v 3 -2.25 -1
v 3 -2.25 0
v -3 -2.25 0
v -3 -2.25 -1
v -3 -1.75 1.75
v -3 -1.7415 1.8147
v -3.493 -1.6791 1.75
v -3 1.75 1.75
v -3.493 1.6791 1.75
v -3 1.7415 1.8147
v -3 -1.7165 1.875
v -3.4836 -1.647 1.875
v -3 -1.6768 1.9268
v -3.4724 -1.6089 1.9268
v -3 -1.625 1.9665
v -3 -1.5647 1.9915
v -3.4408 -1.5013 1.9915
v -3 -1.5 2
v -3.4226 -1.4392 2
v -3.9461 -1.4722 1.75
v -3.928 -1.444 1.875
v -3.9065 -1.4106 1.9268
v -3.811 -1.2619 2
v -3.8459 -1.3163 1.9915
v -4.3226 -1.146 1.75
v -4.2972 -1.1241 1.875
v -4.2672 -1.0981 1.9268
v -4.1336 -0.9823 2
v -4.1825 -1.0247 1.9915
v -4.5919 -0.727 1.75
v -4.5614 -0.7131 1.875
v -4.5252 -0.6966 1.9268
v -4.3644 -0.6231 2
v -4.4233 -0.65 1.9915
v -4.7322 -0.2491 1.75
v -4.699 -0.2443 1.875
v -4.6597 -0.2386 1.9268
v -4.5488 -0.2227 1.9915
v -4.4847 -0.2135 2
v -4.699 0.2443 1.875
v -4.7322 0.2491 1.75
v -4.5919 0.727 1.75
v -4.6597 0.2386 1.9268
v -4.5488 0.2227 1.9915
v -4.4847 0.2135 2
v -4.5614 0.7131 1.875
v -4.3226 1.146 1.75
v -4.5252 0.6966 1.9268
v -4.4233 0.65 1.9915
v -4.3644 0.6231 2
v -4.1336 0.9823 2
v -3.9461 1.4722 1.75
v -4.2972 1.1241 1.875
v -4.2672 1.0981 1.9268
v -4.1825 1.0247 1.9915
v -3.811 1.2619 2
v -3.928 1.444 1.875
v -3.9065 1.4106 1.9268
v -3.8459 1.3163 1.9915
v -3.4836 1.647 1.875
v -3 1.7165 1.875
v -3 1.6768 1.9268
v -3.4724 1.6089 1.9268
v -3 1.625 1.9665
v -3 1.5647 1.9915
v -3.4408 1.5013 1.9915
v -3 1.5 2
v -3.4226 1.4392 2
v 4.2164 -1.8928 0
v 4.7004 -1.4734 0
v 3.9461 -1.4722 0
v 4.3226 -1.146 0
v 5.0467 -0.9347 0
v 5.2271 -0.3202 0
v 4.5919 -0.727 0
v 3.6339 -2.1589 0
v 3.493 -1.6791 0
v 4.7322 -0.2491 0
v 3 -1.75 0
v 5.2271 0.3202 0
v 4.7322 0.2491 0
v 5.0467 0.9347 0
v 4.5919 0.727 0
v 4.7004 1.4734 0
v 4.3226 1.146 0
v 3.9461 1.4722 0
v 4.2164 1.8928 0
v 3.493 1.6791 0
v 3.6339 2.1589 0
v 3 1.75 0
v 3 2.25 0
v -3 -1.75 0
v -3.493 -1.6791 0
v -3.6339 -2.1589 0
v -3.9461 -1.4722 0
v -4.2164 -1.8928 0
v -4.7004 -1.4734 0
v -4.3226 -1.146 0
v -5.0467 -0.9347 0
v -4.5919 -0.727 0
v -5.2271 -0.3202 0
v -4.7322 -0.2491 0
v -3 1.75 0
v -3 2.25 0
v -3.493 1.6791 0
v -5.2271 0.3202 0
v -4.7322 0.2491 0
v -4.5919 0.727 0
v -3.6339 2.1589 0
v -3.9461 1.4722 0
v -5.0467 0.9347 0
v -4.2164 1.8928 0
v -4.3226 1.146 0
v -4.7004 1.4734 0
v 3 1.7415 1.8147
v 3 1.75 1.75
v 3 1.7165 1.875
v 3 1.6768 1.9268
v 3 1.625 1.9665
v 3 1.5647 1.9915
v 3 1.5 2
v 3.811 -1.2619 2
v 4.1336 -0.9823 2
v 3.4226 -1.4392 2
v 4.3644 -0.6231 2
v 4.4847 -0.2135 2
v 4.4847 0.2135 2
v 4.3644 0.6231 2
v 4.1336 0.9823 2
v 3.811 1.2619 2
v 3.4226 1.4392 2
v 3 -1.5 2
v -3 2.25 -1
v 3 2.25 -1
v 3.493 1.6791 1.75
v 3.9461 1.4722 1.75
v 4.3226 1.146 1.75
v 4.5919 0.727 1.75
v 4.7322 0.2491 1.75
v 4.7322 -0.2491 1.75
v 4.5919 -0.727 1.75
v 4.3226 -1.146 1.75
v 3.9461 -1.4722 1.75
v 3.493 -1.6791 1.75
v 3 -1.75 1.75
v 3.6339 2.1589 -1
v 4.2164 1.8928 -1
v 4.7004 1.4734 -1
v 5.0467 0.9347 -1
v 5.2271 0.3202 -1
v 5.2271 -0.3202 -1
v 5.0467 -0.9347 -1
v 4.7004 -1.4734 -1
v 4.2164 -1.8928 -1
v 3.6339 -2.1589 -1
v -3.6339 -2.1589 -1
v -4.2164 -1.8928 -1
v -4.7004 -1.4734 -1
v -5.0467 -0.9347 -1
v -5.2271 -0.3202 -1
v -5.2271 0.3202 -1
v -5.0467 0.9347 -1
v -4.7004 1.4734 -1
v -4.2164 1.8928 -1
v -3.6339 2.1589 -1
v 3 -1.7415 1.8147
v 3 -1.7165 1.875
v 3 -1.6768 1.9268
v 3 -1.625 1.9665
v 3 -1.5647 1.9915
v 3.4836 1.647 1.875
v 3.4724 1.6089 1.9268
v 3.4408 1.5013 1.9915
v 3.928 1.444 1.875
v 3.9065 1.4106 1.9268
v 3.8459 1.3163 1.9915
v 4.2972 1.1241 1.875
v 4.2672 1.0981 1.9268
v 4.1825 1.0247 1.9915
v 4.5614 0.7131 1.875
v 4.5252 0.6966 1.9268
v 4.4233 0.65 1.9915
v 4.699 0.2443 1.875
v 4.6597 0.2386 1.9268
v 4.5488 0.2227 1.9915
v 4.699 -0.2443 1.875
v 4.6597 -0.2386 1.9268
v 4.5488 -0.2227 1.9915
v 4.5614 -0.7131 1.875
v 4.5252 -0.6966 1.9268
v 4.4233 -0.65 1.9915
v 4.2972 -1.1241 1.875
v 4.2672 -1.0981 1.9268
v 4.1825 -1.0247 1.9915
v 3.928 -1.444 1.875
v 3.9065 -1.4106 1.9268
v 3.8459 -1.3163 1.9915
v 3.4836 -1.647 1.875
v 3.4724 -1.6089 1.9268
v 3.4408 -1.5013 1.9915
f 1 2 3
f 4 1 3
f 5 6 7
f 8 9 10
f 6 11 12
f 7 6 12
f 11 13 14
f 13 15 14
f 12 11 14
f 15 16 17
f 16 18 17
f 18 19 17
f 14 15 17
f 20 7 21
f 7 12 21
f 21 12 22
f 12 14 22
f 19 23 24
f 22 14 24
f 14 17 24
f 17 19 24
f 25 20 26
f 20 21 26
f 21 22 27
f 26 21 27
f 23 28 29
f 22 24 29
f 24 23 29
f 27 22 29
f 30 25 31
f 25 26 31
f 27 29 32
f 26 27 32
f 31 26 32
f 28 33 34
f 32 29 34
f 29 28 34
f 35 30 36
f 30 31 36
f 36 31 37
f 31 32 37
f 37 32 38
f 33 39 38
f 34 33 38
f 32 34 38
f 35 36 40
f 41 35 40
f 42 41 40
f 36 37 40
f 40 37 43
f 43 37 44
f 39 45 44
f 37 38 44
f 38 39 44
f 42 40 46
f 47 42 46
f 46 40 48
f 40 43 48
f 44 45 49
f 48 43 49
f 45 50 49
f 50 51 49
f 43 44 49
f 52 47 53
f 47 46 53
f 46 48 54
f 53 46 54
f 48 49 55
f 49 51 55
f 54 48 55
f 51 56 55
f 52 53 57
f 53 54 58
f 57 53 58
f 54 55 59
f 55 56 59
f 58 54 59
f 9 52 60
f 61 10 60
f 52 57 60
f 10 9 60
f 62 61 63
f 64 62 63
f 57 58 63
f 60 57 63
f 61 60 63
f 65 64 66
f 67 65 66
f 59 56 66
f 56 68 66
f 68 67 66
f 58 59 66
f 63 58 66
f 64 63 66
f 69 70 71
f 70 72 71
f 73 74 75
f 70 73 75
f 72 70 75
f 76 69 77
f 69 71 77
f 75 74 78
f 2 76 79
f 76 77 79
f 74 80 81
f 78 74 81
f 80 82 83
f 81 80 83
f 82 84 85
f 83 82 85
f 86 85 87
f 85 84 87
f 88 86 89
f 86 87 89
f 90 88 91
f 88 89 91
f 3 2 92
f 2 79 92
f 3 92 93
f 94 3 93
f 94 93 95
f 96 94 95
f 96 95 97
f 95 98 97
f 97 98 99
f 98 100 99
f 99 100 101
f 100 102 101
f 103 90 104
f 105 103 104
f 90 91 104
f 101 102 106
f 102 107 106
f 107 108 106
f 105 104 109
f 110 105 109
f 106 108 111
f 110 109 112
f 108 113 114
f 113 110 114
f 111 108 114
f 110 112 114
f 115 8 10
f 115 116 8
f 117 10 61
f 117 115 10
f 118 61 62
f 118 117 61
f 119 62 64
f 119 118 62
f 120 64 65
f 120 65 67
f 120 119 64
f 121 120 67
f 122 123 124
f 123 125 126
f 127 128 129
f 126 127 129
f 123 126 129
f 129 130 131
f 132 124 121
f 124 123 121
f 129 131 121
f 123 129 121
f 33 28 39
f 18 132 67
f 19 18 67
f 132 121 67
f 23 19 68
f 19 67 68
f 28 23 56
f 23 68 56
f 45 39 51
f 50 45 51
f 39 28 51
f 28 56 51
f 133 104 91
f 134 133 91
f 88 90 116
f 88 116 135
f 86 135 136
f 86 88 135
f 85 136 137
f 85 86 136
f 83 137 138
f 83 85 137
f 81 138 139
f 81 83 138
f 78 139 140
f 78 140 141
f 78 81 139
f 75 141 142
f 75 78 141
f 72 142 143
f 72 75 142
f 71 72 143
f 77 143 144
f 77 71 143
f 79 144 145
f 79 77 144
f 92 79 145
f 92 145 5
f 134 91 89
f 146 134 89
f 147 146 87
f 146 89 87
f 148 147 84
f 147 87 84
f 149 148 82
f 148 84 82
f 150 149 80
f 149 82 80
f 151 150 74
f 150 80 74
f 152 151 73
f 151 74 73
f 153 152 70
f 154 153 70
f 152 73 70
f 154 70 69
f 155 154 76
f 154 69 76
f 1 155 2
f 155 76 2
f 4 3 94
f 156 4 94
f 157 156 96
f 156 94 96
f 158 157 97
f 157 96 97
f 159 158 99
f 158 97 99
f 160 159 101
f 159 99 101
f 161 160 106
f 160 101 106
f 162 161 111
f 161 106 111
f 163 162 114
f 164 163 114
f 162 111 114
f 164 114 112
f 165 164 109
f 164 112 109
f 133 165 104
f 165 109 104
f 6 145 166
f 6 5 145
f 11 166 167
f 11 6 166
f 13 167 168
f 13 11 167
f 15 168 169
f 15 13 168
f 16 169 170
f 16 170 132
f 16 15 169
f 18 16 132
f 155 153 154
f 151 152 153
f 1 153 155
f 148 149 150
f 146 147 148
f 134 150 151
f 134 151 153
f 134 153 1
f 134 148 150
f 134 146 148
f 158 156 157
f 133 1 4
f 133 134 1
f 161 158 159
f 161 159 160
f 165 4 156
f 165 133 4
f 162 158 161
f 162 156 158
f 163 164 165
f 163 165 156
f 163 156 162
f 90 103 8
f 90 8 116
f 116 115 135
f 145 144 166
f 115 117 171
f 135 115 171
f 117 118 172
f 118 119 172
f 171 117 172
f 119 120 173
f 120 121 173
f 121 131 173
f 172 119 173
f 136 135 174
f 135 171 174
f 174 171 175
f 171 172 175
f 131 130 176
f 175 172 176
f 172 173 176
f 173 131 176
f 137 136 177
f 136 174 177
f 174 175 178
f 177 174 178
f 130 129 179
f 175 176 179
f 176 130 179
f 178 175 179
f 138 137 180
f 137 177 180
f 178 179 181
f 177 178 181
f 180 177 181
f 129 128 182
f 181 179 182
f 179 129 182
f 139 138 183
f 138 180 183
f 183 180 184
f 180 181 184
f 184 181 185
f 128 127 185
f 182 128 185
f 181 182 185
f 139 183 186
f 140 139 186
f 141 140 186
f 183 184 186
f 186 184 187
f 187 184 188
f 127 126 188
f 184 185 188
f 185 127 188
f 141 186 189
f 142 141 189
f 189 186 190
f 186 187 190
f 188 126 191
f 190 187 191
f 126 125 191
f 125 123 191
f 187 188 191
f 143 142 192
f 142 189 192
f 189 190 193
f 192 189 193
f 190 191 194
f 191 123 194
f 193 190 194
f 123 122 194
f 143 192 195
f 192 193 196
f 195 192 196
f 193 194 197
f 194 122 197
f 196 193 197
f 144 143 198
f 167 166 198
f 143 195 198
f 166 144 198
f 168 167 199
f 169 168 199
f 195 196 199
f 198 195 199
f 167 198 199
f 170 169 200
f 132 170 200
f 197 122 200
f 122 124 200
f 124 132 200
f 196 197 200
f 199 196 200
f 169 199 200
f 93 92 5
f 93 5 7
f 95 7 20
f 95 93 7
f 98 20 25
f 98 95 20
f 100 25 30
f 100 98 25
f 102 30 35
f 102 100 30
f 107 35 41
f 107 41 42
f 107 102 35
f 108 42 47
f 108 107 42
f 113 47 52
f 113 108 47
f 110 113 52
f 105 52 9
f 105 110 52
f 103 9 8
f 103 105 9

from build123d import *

# Parameters (mm, degrees)
BOSS_EXTRU_1_DEPTH = 2
BOSS_EXTRU_2_DEPTH = 1
CONG_1_R           = 0.25


with BuildPart() as part:
    # Esquisse1 → Boss.-Extru.1 (new body)
    with BuildSketch(Plane.XY):
        with BuildLine():
            Line((-3, 1.75), (3, 1.75))
            ThreePointArc((3, 1.75), (4.75, 0), (3, -1.75))
            Line((3, -1.75), (-3, -1.75))
            ThreePointArc((-3, -1.75), (-4.75, 0), (-3, 1.75))
        make_face()
    extrude(amount=BOSS_EXTRU_1_DEPTH)

    # Esquisse3 → Boss.-Extru.2 (add)
    with BuildSketch(Plane.XY):
        with BuildLine():
            Line((-3, 2.25), (3, 2.25))
            ThreePointArc((3, 2.25), (5.25, 0), (3, -2.25))
            Line((3, -2.25), (-3, -2.25))
            ThreePointArc((-3, -2.25), (-5.25, 0), (-3, 2.25))
        make_face()
    extrude(amount=-BOSS_EXTRU_2_DEPTH)

    # Congé1
    cong_1_edges = [part.edges().sort_by_distance(p)[0] for p in [
        (4.75, 0, 2),
        (0, 1.75, 2),
        (-4.75, 0, 2),
        (0, -1.75, 2),
    ]]
    fillet(cong_1_edges, radius=CONG_1_R)


solid = part.part
